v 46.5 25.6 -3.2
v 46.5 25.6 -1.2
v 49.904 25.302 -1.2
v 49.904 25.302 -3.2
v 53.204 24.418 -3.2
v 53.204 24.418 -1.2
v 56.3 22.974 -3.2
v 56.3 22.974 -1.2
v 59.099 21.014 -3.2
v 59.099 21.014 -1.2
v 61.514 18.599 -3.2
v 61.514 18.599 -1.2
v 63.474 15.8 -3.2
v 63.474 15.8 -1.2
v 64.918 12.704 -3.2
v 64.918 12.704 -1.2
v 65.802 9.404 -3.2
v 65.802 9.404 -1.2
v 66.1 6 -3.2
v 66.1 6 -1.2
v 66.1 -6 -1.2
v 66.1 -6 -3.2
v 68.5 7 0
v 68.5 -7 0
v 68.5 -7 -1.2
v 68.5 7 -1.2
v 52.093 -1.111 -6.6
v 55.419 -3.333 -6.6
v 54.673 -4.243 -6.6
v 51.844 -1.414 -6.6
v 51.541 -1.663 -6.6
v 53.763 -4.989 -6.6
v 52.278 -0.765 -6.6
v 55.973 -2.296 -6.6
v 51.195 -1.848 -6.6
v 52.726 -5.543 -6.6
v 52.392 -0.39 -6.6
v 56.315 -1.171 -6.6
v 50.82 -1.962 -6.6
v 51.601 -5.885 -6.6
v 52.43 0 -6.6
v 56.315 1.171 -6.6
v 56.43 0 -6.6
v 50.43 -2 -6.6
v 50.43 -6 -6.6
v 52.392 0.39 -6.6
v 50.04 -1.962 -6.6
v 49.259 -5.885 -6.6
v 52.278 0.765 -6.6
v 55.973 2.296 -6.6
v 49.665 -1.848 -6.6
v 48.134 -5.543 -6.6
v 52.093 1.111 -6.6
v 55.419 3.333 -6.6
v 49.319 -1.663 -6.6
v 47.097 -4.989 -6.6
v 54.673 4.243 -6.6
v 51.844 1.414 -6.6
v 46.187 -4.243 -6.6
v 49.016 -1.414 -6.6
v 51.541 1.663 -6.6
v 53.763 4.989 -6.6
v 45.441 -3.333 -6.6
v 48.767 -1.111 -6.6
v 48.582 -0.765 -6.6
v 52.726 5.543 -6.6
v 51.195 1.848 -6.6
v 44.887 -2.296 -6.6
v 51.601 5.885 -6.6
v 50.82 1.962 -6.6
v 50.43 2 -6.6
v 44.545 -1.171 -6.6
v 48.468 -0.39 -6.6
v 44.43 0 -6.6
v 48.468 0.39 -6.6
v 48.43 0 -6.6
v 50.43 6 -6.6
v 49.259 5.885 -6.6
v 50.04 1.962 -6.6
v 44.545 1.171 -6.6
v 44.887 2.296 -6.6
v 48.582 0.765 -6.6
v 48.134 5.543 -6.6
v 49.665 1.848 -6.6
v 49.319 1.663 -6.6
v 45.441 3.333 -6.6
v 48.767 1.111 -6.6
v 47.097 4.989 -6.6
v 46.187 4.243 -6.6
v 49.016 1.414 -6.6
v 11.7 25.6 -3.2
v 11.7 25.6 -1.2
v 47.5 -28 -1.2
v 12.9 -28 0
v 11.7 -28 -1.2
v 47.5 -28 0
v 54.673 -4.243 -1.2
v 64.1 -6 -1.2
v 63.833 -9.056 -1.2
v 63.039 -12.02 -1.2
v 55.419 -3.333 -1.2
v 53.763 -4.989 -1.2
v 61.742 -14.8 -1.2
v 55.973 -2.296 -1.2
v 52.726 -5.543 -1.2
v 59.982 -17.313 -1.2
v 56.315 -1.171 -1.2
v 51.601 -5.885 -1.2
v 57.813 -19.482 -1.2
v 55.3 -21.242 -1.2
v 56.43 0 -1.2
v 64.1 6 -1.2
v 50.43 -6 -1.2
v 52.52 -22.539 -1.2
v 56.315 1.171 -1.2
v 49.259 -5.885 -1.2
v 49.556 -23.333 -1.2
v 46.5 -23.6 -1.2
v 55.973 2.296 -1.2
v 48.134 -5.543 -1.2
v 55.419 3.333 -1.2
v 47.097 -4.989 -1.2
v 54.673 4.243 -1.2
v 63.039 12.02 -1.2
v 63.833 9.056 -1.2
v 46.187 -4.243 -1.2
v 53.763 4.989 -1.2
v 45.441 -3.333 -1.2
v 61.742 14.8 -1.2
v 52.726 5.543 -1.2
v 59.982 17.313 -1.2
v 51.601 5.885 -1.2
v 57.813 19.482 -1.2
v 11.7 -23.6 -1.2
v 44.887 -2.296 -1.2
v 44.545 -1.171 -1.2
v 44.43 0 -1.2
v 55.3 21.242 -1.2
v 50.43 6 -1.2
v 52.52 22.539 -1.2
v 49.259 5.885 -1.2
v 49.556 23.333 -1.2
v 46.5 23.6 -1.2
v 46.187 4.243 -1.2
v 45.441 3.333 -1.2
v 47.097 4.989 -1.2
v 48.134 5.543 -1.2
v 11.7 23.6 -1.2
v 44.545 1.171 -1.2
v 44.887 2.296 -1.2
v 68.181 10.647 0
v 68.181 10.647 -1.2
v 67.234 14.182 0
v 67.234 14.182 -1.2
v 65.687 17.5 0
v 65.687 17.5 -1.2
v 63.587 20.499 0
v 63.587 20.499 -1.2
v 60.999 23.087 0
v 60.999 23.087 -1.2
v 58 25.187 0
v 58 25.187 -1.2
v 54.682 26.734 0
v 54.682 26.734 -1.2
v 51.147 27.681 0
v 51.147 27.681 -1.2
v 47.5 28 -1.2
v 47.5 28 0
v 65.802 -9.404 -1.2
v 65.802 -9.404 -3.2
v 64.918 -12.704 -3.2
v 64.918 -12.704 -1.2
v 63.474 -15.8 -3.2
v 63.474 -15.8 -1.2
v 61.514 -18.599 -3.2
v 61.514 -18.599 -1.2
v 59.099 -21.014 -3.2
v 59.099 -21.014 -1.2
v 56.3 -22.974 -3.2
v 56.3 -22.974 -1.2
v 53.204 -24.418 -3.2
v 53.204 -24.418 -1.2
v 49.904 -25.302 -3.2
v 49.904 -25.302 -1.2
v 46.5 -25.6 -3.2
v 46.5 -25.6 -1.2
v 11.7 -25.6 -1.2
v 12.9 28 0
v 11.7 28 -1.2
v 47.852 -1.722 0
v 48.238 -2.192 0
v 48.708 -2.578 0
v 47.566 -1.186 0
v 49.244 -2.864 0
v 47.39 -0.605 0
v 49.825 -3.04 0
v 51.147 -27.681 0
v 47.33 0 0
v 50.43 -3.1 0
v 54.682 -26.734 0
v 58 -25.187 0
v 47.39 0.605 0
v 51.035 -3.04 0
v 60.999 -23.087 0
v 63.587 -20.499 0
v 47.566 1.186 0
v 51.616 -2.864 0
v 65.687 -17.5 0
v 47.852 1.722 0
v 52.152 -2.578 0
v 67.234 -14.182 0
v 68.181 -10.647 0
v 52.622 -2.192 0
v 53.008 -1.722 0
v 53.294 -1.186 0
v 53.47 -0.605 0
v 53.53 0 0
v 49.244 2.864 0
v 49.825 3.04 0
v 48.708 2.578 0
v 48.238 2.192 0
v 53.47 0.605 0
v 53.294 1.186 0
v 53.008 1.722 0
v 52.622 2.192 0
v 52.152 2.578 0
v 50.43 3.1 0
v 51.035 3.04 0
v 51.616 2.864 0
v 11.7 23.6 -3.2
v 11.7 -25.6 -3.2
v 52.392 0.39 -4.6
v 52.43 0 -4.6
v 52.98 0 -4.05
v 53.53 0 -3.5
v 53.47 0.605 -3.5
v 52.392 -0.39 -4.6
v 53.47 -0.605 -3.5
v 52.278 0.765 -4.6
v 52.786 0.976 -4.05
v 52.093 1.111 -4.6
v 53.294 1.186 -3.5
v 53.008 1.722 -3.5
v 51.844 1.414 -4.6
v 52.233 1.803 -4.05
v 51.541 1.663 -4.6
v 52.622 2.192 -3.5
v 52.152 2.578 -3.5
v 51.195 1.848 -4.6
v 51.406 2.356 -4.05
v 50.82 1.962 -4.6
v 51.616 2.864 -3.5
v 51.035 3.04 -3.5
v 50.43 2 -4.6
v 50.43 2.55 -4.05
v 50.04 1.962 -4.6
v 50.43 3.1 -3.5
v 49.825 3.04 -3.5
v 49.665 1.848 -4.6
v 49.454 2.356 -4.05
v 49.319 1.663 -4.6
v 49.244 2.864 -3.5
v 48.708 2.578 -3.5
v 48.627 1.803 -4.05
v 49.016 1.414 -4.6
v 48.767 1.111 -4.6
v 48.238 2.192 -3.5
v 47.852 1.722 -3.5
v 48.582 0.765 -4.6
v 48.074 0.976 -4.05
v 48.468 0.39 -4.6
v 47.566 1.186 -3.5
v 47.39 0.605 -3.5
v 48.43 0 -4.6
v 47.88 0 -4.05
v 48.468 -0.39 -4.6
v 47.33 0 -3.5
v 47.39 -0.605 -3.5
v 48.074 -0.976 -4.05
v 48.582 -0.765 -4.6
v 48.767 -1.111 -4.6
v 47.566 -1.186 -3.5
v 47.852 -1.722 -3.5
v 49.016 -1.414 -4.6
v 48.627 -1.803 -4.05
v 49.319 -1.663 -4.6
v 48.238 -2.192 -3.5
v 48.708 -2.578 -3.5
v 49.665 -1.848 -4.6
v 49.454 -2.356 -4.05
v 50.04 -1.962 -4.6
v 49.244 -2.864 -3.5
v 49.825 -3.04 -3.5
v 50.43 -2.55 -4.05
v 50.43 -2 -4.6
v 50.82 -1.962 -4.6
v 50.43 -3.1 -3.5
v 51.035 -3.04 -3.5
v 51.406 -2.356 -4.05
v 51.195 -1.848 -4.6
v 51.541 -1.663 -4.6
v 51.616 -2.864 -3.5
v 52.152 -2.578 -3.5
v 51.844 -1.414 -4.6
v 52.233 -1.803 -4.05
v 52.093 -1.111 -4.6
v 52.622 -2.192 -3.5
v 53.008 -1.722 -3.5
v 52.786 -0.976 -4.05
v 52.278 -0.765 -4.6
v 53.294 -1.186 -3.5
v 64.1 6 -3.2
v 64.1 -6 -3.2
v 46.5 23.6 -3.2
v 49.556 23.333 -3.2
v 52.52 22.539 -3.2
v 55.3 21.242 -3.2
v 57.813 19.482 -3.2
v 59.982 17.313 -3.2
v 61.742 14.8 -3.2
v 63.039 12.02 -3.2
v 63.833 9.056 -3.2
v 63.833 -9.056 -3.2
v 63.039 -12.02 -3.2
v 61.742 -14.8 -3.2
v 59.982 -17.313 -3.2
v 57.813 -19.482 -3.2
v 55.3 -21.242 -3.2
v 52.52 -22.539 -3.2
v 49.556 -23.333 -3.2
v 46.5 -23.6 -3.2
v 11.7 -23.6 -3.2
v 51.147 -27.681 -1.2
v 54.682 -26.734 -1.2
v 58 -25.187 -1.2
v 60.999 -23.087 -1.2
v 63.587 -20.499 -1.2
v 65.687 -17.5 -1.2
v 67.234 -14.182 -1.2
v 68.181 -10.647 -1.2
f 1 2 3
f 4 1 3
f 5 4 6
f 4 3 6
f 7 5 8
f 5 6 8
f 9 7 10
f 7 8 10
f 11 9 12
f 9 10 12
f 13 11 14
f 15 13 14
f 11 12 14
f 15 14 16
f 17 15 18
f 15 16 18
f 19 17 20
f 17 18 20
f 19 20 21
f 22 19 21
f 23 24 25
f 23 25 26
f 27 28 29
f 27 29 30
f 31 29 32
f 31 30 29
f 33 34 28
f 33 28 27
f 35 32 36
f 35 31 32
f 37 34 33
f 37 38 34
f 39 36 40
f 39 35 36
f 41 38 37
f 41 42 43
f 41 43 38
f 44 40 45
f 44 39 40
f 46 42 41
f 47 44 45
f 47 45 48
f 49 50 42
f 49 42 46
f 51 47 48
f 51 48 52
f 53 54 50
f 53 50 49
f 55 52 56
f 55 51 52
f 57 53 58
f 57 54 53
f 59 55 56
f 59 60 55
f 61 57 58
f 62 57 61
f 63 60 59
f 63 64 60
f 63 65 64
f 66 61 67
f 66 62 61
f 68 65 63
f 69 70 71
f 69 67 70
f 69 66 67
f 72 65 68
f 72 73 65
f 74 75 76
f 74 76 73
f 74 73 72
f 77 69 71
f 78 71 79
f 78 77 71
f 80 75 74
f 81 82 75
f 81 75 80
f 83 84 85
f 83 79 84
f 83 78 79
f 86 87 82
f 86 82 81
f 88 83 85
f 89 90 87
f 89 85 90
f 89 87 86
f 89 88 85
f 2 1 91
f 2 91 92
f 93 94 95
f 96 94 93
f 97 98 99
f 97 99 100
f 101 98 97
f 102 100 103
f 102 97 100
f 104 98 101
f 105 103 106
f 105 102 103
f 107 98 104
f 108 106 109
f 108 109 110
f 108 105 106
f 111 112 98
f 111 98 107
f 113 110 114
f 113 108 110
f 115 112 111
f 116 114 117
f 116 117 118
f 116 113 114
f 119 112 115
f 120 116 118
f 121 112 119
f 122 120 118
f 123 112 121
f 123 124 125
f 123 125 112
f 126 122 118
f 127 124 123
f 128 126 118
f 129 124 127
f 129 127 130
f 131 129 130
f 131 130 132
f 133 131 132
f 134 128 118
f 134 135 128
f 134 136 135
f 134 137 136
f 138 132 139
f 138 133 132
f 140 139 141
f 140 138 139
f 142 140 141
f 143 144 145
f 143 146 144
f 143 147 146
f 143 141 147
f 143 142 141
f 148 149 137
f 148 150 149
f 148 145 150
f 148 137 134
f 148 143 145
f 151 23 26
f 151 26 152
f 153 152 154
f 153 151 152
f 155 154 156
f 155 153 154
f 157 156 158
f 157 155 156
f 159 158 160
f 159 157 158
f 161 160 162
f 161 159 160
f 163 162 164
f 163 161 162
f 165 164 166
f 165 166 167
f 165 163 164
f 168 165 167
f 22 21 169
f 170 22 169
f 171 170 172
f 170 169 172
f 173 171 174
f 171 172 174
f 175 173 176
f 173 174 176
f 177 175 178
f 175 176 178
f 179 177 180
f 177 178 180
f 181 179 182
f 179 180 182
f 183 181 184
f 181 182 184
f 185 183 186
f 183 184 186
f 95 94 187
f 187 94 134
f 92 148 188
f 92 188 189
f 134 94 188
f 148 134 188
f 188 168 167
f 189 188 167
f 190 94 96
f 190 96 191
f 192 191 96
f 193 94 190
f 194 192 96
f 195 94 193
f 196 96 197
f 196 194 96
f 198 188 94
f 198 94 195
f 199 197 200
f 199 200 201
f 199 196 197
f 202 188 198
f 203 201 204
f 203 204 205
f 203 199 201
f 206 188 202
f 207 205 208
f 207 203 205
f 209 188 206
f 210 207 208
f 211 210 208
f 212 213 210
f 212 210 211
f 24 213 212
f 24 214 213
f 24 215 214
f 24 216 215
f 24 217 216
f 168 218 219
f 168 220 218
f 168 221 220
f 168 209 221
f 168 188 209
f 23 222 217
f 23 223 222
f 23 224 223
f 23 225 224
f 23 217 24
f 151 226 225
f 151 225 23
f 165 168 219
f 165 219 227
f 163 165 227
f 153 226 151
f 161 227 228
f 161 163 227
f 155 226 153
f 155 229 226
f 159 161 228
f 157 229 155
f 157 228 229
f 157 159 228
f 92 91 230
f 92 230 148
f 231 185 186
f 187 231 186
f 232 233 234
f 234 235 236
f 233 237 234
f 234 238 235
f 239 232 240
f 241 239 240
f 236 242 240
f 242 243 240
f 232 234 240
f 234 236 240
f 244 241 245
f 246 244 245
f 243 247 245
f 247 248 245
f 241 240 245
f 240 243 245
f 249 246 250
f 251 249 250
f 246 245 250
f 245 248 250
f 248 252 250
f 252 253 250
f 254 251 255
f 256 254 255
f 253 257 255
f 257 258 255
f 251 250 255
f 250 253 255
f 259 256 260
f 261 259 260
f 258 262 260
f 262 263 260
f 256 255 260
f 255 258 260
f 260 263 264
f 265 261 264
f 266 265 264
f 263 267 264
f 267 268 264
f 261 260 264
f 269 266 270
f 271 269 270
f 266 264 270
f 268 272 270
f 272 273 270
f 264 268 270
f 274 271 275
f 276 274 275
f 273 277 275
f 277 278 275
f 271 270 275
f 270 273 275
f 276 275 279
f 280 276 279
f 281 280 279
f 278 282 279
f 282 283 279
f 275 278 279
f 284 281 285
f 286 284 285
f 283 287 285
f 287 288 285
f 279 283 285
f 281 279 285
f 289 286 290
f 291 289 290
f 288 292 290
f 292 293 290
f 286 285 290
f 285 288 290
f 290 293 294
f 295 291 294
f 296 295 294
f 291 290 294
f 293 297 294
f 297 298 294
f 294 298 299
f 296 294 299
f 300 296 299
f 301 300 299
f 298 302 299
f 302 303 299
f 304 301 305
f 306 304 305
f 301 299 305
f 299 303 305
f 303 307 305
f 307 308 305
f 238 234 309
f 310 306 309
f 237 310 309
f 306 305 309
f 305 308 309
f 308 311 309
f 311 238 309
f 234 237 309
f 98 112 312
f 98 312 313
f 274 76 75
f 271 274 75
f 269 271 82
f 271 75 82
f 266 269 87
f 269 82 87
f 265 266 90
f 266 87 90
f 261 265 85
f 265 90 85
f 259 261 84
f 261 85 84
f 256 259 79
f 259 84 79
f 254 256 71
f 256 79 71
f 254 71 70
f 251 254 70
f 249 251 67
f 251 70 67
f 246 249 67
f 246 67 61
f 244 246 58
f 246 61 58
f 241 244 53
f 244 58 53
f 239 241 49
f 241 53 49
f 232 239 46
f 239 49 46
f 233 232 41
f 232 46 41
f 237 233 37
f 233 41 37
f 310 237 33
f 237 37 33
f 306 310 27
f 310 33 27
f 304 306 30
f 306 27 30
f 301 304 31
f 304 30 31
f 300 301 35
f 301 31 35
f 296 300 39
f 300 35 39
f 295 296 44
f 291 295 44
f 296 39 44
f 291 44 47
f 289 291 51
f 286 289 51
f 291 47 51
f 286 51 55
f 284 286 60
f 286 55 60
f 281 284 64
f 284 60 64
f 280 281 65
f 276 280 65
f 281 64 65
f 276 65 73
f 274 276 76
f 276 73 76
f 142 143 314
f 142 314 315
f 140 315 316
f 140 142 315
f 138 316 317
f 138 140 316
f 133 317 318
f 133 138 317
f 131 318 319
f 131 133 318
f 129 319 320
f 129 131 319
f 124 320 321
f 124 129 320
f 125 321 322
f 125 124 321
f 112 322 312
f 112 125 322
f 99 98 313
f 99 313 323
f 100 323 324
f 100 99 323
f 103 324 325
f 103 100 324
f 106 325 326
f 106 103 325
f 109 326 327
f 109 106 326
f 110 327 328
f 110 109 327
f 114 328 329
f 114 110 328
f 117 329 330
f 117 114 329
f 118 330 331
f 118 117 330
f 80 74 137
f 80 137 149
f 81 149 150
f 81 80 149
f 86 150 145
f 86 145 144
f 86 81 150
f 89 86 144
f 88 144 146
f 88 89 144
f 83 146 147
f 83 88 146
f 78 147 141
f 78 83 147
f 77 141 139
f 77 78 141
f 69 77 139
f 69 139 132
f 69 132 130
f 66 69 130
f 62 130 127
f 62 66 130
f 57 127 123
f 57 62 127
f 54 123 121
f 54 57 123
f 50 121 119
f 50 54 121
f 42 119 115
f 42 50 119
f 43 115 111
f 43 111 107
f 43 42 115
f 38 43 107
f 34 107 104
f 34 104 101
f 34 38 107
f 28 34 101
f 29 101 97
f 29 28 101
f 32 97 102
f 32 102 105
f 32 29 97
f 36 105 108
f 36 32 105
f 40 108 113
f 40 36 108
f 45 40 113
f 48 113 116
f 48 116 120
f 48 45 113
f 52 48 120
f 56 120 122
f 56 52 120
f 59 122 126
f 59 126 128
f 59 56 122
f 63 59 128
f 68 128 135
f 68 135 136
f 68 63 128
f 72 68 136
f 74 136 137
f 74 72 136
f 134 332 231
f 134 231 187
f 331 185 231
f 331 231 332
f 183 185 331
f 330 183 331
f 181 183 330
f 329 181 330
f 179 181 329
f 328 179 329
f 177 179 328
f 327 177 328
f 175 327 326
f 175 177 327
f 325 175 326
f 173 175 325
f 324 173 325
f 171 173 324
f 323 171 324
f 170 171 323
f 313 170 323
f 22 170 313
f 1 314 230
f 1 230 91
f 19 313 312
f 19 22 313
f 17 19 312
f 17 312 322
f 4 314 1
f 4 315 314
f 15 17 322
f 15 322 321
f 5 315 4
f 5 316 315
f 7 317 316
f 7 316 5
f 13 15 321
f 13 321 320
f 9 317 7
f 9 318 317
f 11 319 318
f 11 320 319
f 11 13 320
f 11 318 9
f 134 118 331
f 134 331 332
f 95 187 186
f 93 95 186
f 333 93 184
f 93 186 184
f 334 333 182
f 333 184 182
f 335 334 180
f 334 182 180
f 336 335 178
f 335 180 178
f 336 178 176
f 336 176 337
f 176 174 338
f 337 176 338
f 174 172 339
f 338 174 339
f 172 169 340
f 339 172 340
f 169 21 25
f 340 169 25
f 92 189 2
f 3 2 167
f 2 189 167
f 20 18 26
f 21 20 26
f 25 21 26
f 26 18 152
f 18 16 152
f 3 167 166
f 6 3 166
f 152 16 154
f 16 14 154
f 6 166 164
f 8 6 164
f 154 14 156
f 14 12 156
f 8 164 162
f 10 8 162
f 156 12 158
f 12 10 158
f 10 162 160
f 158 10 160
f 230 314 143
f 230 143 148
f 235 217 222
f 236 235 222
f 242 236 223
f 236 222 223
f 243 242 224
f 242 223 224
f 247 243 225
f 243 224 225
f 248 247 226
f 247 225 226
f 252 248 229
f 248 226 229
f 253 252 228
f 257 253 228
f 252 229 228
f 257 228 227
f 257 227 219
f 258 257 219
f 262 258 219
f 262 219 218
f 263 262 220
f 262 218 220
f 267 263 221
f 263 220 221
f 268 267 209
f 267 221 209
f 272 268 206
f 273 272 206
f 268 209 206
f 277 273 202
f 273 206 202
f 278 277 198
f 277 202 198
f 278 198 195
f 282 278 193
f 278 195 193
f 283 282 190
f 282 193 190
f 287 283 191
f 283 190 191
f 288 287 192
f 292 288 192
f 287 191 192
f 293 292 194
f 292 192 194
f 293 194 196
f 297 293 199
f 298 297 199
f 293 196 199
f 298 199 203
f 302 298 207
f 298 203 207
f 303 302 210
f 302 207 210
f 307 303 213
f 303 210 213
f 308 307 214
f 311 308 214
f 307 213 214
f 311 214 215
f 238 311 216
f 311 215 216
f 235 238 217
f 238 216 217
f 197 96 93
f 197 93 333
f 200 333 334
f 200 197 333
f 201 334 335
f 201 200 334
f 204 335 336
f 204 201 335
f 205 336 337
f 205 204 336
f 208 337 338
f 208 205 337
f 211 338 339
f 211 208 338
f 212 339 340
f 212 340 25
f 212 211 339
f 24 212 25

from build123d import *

# Parameters (mm, degrees)
SKETCH_2_R            = 2.6
EXTRUDE_1_DEPTH       = 1.2
EXTRUDE_1_2_DEPTH     = 2
CUT_EXTRUDE_START     = -2
CUT_EXTRUDE_1_DEPTH   = 2
SKETCH_7_W            = 2
SKETCH_7_H            = 51.2
EXTRUDE_2_DEPTH       = 0.4
SKETCH_8_W            = 2.4
SKETCH_8_H            = 47.2
CUT_EXTRUDE_1_2_DEPTH = 2
CUT_EXTRUDE_2_DEPTH   = 62
SKETCH_10_W           = 2
SKETCH_10_H           = 2
CUT_EXTRUDE_3_DEPTH   = 0.2
SKETCH_11_W           = 14.43
SKETCH_11_H           = 14
SKETCH_11_R           = 2.6
EXTRUDE_3_DEPTH       = 5.4
SKETCH_12_R           = 3
SKETCH_12_R_2         = 2
EXTRUDE_2_2_DEPTH     = 2
SKETCH_13_R           = 3.1
CUT_EXTRUDE_4_DEPTH   = 4.6
CHAMFER_1_SIZE        = 1.1
SKETCH_14_R           = 11
SKETCH_14_R_2         = 6
CUT_EXTRUDE_2_2_DEPTH = 5.4


with BuildPart() as part:
    # Эскиз2 → Extrude 1 (new body)
    with BuildSketch(Plane.XY):
        with BuildLine():
            Line((68.5, -7), (68.5, 7))
            ThreePointArc((68.5, 7), (62.349242405, 21.849242405), (47.5, 28))
            Line((47.5, 28), (11.5, 28))
            Line((11.5, 28), (11.5, -28))
            Line((11.5, -28), (47.5, -28))
            ThreePointArc((47.5, -28), (62.349242405, -21.849242405), (68.5, -7))
        make_face()
        with Locations((50.43, 0)):
            Circle(SKETCH_2_R, mode=Mode.SUBTRACT)
    extrude(amount=-EXTRUDE_1_DEPTH)

    # Эскиз3 → Extrude 1 2 (add)
    with BuildSketch(Plane(origin=(0, 0, -1.2), x_dir=(-1, 0, 0), z_dir=(0, 0, -1))):
        with BuildLine():
            Line((-46.5, -26), (-11.5, -26))
            Line((-11.5, -26), (-11.5, 26))
            Line((-11.5, 26), (-46.5, 26))
            ThreePointArc((-46.5, 26), (-60.642135624, 20.142135624), (-66.5, 6))
            Line((-66.5, 6), (-66.5, -6))
            ThreePointArc((-66.5, -6), (-60.642135624, -20.142135624), (-46.5, -26))
        make_face()
        with BuildLine():
            Line((-46.5, -23.6), (-13.9, -23.6))
            Line((-13.9, -23.6), (-13.9, 23.6))
            Line((-13.9, 23.6), (-46.5, 23.6))
            ThreePointArc((-46.5, 23.6), (-58.945079349, 18.445079349), (-64.1, 6))
            Line((-64.1, 6), (-64.1, -6))
            ThreePointArc((-64.1, -6), (-58.945079349, -18.445079349), (-46.5, -23.6))
        make_face(mode=Mode.SUBTRACT)
    extrude(amount=EXTRUDE_1_2_DEPTH)

    # Эскиз4 → Cut-Extrude 1 (cut)
    with BuildSketch(Plane(origin=(0, 0, -3.2), x_dir=(-1, 0, 0), z_dir=(0, 0, -1)).offset(CUT_EXTRUDE_START)):
        with BuildLine():
            Line((-66.5, 6), (-66.5, -6))
            ThreePointArc((-66.5, -6), (-60.642135624, -20.142135624), (-46.5, -26))
            Line((-46.5, -26), (-11.5, -26))
            Line((-11.5, -26), (-11.5, 26))
            Line((-11.5, 26), (-46.5, 26))
            ThreePointArc((-46.5, 26), (-60.642135624, 20.142135624), (-66.5, 6))
        make_face()
        with BuildLine():
            Line((-66.1, 6), (-66.1, -6))
            ThreePointArc((-66.1, -6), (-60.359292911, -19.859292911), (-46.5, -25.6))
            Line((-46.5, -25.6), (-11.9, -25.6))
            Line((-11.9, -25.6), (-11.9, 25.6))
            Line((-11.9, 25.6), (-46.5, 25.6))
            ThreePointArc((-46.5, 25.6), (-60.359292911, 19.859292911), (-66.1, 6))
        make_face(mode=Mode.SUBTRACT)
    extrude(amount=CUT_EXTRUDE_1_DEPTH, mode=Mode.SUBTRACT)

    # Эскиз7 → Extrude 2 (add)
    with BuildSketch(Plane.ZY.offset(-11.9)):
        with Locations((-2.2, 0)):
            Rectangle(SKETCH_7_W, SKETCH_7_H)
    extrude(amount=EXTRUDE_2_DEPTH)

    # Эскиз8 → Cut-Extrude 1 2 (cut)
    with BuildSketch(Plane(origin=(0, 0, -3.2), x_dir=(-1, 0, 0), z_dir=(0, 0, -1))):
        with Locations((-12.7, 0)):
            Rectangle(SKETCH_8_W, SKETCH_8_H)
    extrude(amount=-CUT_EXTRUDE_1_2_DEPTH, mode=Mode.SUBTRACT)

    # Эскиз9 → Cut-Extrude 2 (cut)
    with BuildSketch(Plane(origin=(0, 28, 0), x_dir=(1, 0, 0), z_dir=(0, 1, 0))):
        Polygon((11.5, 0), (12.9, 0), (11.7, 1.2), (11.5, 1.2), align=None)
    extrude(amount=-CUT_EXTRUDE_2_DEPTH, mode=Mode.SUBTRACT)

    # Эскиз10 → Вырез-Вытянуть3 (cut)
    with BuildSketch(Plane.ZY.offset(-11.5)):
        with Locations((-2.2, 24.6)):
            Rectangle(SKETCH_10_W, SKETCH_10_H)
        with Locations((-2.2, -24.6)):
            Rectangle(SKETCH_10_W, SKETCH_10_H)
    extrude(amount=-CUT_EXTRUDE_3_DEPTH, mode=Mode.SUBTRACT)

    # Эскиз11 → Бобышка-Вытянуть3 (add)
    with BuildSketch(Plane(origin=(0, 0, -1.2), x_dir=(-1, 0, 0), z_dir=(0, 0, -1))):
        with Locations((-50.215, 0)):
            Rectangle(SKETCH_11_W, SKETCH_11_H)
        with Locations(Location((-50.43, 0, 0), (0, 0, 180))):
            Circle(SKETCH_11_R, mode=Mode.SUBTRACT)
    extrude(amount=EXTRUDE_3_DEPTH)

    # Эскиз12 → Extrude 2 2 (add)
    with BuildSketch(Plane(origin=(0, 0, -6.6), x_dir=(-1, 0, 0), z_dir=(0, 0, -1))):
        with Locations((-50.43, 0)):
            Circle(SKETCH_12_R)
        with Locations((-50.43, 0)):
            Circle(SKETCH_12_R_2, mode=Mode.SUBTRACT)
    extrude(amount=-EXTRUDE_2_2_DEPTH)

    # Эскиз13 → Вырез-Вытянуть4 (cut)
    with BuildSketch(Plane.XY):
        with Locations((50.43, 0)):
            Circle(SKETCH_13_R)
    extrude(amount=-CUT_EXTRUDE_4_DEPTH, mode=Mode.SUBTRACT)

    # Фаска1
    chamfer_1_edges = [part.edges().sort_by_distance(p)[0] for p in [
        (47.33, 0, -4.6),
    ]]
    chamfer(chamfer_1_edges, length=CHAMFER_1_SIZE - 0.0001)  # a hair under: the kernel refuses the full size

    # Эскиз14 → Cut-Extrude 2 2 (cut)
    with BuildSketch(Plane(origin=(0, 0, -6.6), x_dir=(-1, 0, 0), z_dir=(0, 0, -1))):
        with Locations((-50.43, 0)):
            Circle(SKETCH_14_R)
        with Locations((-50.43, 0)):
            Circle(SKETCH_14_R_2, mode=Mode.SUBTRACT)
    extrude(amount=-CUT_EXTRUDE_2_2_DEPTH, mode=Mode.SUBTRACT)


solid = part.part
